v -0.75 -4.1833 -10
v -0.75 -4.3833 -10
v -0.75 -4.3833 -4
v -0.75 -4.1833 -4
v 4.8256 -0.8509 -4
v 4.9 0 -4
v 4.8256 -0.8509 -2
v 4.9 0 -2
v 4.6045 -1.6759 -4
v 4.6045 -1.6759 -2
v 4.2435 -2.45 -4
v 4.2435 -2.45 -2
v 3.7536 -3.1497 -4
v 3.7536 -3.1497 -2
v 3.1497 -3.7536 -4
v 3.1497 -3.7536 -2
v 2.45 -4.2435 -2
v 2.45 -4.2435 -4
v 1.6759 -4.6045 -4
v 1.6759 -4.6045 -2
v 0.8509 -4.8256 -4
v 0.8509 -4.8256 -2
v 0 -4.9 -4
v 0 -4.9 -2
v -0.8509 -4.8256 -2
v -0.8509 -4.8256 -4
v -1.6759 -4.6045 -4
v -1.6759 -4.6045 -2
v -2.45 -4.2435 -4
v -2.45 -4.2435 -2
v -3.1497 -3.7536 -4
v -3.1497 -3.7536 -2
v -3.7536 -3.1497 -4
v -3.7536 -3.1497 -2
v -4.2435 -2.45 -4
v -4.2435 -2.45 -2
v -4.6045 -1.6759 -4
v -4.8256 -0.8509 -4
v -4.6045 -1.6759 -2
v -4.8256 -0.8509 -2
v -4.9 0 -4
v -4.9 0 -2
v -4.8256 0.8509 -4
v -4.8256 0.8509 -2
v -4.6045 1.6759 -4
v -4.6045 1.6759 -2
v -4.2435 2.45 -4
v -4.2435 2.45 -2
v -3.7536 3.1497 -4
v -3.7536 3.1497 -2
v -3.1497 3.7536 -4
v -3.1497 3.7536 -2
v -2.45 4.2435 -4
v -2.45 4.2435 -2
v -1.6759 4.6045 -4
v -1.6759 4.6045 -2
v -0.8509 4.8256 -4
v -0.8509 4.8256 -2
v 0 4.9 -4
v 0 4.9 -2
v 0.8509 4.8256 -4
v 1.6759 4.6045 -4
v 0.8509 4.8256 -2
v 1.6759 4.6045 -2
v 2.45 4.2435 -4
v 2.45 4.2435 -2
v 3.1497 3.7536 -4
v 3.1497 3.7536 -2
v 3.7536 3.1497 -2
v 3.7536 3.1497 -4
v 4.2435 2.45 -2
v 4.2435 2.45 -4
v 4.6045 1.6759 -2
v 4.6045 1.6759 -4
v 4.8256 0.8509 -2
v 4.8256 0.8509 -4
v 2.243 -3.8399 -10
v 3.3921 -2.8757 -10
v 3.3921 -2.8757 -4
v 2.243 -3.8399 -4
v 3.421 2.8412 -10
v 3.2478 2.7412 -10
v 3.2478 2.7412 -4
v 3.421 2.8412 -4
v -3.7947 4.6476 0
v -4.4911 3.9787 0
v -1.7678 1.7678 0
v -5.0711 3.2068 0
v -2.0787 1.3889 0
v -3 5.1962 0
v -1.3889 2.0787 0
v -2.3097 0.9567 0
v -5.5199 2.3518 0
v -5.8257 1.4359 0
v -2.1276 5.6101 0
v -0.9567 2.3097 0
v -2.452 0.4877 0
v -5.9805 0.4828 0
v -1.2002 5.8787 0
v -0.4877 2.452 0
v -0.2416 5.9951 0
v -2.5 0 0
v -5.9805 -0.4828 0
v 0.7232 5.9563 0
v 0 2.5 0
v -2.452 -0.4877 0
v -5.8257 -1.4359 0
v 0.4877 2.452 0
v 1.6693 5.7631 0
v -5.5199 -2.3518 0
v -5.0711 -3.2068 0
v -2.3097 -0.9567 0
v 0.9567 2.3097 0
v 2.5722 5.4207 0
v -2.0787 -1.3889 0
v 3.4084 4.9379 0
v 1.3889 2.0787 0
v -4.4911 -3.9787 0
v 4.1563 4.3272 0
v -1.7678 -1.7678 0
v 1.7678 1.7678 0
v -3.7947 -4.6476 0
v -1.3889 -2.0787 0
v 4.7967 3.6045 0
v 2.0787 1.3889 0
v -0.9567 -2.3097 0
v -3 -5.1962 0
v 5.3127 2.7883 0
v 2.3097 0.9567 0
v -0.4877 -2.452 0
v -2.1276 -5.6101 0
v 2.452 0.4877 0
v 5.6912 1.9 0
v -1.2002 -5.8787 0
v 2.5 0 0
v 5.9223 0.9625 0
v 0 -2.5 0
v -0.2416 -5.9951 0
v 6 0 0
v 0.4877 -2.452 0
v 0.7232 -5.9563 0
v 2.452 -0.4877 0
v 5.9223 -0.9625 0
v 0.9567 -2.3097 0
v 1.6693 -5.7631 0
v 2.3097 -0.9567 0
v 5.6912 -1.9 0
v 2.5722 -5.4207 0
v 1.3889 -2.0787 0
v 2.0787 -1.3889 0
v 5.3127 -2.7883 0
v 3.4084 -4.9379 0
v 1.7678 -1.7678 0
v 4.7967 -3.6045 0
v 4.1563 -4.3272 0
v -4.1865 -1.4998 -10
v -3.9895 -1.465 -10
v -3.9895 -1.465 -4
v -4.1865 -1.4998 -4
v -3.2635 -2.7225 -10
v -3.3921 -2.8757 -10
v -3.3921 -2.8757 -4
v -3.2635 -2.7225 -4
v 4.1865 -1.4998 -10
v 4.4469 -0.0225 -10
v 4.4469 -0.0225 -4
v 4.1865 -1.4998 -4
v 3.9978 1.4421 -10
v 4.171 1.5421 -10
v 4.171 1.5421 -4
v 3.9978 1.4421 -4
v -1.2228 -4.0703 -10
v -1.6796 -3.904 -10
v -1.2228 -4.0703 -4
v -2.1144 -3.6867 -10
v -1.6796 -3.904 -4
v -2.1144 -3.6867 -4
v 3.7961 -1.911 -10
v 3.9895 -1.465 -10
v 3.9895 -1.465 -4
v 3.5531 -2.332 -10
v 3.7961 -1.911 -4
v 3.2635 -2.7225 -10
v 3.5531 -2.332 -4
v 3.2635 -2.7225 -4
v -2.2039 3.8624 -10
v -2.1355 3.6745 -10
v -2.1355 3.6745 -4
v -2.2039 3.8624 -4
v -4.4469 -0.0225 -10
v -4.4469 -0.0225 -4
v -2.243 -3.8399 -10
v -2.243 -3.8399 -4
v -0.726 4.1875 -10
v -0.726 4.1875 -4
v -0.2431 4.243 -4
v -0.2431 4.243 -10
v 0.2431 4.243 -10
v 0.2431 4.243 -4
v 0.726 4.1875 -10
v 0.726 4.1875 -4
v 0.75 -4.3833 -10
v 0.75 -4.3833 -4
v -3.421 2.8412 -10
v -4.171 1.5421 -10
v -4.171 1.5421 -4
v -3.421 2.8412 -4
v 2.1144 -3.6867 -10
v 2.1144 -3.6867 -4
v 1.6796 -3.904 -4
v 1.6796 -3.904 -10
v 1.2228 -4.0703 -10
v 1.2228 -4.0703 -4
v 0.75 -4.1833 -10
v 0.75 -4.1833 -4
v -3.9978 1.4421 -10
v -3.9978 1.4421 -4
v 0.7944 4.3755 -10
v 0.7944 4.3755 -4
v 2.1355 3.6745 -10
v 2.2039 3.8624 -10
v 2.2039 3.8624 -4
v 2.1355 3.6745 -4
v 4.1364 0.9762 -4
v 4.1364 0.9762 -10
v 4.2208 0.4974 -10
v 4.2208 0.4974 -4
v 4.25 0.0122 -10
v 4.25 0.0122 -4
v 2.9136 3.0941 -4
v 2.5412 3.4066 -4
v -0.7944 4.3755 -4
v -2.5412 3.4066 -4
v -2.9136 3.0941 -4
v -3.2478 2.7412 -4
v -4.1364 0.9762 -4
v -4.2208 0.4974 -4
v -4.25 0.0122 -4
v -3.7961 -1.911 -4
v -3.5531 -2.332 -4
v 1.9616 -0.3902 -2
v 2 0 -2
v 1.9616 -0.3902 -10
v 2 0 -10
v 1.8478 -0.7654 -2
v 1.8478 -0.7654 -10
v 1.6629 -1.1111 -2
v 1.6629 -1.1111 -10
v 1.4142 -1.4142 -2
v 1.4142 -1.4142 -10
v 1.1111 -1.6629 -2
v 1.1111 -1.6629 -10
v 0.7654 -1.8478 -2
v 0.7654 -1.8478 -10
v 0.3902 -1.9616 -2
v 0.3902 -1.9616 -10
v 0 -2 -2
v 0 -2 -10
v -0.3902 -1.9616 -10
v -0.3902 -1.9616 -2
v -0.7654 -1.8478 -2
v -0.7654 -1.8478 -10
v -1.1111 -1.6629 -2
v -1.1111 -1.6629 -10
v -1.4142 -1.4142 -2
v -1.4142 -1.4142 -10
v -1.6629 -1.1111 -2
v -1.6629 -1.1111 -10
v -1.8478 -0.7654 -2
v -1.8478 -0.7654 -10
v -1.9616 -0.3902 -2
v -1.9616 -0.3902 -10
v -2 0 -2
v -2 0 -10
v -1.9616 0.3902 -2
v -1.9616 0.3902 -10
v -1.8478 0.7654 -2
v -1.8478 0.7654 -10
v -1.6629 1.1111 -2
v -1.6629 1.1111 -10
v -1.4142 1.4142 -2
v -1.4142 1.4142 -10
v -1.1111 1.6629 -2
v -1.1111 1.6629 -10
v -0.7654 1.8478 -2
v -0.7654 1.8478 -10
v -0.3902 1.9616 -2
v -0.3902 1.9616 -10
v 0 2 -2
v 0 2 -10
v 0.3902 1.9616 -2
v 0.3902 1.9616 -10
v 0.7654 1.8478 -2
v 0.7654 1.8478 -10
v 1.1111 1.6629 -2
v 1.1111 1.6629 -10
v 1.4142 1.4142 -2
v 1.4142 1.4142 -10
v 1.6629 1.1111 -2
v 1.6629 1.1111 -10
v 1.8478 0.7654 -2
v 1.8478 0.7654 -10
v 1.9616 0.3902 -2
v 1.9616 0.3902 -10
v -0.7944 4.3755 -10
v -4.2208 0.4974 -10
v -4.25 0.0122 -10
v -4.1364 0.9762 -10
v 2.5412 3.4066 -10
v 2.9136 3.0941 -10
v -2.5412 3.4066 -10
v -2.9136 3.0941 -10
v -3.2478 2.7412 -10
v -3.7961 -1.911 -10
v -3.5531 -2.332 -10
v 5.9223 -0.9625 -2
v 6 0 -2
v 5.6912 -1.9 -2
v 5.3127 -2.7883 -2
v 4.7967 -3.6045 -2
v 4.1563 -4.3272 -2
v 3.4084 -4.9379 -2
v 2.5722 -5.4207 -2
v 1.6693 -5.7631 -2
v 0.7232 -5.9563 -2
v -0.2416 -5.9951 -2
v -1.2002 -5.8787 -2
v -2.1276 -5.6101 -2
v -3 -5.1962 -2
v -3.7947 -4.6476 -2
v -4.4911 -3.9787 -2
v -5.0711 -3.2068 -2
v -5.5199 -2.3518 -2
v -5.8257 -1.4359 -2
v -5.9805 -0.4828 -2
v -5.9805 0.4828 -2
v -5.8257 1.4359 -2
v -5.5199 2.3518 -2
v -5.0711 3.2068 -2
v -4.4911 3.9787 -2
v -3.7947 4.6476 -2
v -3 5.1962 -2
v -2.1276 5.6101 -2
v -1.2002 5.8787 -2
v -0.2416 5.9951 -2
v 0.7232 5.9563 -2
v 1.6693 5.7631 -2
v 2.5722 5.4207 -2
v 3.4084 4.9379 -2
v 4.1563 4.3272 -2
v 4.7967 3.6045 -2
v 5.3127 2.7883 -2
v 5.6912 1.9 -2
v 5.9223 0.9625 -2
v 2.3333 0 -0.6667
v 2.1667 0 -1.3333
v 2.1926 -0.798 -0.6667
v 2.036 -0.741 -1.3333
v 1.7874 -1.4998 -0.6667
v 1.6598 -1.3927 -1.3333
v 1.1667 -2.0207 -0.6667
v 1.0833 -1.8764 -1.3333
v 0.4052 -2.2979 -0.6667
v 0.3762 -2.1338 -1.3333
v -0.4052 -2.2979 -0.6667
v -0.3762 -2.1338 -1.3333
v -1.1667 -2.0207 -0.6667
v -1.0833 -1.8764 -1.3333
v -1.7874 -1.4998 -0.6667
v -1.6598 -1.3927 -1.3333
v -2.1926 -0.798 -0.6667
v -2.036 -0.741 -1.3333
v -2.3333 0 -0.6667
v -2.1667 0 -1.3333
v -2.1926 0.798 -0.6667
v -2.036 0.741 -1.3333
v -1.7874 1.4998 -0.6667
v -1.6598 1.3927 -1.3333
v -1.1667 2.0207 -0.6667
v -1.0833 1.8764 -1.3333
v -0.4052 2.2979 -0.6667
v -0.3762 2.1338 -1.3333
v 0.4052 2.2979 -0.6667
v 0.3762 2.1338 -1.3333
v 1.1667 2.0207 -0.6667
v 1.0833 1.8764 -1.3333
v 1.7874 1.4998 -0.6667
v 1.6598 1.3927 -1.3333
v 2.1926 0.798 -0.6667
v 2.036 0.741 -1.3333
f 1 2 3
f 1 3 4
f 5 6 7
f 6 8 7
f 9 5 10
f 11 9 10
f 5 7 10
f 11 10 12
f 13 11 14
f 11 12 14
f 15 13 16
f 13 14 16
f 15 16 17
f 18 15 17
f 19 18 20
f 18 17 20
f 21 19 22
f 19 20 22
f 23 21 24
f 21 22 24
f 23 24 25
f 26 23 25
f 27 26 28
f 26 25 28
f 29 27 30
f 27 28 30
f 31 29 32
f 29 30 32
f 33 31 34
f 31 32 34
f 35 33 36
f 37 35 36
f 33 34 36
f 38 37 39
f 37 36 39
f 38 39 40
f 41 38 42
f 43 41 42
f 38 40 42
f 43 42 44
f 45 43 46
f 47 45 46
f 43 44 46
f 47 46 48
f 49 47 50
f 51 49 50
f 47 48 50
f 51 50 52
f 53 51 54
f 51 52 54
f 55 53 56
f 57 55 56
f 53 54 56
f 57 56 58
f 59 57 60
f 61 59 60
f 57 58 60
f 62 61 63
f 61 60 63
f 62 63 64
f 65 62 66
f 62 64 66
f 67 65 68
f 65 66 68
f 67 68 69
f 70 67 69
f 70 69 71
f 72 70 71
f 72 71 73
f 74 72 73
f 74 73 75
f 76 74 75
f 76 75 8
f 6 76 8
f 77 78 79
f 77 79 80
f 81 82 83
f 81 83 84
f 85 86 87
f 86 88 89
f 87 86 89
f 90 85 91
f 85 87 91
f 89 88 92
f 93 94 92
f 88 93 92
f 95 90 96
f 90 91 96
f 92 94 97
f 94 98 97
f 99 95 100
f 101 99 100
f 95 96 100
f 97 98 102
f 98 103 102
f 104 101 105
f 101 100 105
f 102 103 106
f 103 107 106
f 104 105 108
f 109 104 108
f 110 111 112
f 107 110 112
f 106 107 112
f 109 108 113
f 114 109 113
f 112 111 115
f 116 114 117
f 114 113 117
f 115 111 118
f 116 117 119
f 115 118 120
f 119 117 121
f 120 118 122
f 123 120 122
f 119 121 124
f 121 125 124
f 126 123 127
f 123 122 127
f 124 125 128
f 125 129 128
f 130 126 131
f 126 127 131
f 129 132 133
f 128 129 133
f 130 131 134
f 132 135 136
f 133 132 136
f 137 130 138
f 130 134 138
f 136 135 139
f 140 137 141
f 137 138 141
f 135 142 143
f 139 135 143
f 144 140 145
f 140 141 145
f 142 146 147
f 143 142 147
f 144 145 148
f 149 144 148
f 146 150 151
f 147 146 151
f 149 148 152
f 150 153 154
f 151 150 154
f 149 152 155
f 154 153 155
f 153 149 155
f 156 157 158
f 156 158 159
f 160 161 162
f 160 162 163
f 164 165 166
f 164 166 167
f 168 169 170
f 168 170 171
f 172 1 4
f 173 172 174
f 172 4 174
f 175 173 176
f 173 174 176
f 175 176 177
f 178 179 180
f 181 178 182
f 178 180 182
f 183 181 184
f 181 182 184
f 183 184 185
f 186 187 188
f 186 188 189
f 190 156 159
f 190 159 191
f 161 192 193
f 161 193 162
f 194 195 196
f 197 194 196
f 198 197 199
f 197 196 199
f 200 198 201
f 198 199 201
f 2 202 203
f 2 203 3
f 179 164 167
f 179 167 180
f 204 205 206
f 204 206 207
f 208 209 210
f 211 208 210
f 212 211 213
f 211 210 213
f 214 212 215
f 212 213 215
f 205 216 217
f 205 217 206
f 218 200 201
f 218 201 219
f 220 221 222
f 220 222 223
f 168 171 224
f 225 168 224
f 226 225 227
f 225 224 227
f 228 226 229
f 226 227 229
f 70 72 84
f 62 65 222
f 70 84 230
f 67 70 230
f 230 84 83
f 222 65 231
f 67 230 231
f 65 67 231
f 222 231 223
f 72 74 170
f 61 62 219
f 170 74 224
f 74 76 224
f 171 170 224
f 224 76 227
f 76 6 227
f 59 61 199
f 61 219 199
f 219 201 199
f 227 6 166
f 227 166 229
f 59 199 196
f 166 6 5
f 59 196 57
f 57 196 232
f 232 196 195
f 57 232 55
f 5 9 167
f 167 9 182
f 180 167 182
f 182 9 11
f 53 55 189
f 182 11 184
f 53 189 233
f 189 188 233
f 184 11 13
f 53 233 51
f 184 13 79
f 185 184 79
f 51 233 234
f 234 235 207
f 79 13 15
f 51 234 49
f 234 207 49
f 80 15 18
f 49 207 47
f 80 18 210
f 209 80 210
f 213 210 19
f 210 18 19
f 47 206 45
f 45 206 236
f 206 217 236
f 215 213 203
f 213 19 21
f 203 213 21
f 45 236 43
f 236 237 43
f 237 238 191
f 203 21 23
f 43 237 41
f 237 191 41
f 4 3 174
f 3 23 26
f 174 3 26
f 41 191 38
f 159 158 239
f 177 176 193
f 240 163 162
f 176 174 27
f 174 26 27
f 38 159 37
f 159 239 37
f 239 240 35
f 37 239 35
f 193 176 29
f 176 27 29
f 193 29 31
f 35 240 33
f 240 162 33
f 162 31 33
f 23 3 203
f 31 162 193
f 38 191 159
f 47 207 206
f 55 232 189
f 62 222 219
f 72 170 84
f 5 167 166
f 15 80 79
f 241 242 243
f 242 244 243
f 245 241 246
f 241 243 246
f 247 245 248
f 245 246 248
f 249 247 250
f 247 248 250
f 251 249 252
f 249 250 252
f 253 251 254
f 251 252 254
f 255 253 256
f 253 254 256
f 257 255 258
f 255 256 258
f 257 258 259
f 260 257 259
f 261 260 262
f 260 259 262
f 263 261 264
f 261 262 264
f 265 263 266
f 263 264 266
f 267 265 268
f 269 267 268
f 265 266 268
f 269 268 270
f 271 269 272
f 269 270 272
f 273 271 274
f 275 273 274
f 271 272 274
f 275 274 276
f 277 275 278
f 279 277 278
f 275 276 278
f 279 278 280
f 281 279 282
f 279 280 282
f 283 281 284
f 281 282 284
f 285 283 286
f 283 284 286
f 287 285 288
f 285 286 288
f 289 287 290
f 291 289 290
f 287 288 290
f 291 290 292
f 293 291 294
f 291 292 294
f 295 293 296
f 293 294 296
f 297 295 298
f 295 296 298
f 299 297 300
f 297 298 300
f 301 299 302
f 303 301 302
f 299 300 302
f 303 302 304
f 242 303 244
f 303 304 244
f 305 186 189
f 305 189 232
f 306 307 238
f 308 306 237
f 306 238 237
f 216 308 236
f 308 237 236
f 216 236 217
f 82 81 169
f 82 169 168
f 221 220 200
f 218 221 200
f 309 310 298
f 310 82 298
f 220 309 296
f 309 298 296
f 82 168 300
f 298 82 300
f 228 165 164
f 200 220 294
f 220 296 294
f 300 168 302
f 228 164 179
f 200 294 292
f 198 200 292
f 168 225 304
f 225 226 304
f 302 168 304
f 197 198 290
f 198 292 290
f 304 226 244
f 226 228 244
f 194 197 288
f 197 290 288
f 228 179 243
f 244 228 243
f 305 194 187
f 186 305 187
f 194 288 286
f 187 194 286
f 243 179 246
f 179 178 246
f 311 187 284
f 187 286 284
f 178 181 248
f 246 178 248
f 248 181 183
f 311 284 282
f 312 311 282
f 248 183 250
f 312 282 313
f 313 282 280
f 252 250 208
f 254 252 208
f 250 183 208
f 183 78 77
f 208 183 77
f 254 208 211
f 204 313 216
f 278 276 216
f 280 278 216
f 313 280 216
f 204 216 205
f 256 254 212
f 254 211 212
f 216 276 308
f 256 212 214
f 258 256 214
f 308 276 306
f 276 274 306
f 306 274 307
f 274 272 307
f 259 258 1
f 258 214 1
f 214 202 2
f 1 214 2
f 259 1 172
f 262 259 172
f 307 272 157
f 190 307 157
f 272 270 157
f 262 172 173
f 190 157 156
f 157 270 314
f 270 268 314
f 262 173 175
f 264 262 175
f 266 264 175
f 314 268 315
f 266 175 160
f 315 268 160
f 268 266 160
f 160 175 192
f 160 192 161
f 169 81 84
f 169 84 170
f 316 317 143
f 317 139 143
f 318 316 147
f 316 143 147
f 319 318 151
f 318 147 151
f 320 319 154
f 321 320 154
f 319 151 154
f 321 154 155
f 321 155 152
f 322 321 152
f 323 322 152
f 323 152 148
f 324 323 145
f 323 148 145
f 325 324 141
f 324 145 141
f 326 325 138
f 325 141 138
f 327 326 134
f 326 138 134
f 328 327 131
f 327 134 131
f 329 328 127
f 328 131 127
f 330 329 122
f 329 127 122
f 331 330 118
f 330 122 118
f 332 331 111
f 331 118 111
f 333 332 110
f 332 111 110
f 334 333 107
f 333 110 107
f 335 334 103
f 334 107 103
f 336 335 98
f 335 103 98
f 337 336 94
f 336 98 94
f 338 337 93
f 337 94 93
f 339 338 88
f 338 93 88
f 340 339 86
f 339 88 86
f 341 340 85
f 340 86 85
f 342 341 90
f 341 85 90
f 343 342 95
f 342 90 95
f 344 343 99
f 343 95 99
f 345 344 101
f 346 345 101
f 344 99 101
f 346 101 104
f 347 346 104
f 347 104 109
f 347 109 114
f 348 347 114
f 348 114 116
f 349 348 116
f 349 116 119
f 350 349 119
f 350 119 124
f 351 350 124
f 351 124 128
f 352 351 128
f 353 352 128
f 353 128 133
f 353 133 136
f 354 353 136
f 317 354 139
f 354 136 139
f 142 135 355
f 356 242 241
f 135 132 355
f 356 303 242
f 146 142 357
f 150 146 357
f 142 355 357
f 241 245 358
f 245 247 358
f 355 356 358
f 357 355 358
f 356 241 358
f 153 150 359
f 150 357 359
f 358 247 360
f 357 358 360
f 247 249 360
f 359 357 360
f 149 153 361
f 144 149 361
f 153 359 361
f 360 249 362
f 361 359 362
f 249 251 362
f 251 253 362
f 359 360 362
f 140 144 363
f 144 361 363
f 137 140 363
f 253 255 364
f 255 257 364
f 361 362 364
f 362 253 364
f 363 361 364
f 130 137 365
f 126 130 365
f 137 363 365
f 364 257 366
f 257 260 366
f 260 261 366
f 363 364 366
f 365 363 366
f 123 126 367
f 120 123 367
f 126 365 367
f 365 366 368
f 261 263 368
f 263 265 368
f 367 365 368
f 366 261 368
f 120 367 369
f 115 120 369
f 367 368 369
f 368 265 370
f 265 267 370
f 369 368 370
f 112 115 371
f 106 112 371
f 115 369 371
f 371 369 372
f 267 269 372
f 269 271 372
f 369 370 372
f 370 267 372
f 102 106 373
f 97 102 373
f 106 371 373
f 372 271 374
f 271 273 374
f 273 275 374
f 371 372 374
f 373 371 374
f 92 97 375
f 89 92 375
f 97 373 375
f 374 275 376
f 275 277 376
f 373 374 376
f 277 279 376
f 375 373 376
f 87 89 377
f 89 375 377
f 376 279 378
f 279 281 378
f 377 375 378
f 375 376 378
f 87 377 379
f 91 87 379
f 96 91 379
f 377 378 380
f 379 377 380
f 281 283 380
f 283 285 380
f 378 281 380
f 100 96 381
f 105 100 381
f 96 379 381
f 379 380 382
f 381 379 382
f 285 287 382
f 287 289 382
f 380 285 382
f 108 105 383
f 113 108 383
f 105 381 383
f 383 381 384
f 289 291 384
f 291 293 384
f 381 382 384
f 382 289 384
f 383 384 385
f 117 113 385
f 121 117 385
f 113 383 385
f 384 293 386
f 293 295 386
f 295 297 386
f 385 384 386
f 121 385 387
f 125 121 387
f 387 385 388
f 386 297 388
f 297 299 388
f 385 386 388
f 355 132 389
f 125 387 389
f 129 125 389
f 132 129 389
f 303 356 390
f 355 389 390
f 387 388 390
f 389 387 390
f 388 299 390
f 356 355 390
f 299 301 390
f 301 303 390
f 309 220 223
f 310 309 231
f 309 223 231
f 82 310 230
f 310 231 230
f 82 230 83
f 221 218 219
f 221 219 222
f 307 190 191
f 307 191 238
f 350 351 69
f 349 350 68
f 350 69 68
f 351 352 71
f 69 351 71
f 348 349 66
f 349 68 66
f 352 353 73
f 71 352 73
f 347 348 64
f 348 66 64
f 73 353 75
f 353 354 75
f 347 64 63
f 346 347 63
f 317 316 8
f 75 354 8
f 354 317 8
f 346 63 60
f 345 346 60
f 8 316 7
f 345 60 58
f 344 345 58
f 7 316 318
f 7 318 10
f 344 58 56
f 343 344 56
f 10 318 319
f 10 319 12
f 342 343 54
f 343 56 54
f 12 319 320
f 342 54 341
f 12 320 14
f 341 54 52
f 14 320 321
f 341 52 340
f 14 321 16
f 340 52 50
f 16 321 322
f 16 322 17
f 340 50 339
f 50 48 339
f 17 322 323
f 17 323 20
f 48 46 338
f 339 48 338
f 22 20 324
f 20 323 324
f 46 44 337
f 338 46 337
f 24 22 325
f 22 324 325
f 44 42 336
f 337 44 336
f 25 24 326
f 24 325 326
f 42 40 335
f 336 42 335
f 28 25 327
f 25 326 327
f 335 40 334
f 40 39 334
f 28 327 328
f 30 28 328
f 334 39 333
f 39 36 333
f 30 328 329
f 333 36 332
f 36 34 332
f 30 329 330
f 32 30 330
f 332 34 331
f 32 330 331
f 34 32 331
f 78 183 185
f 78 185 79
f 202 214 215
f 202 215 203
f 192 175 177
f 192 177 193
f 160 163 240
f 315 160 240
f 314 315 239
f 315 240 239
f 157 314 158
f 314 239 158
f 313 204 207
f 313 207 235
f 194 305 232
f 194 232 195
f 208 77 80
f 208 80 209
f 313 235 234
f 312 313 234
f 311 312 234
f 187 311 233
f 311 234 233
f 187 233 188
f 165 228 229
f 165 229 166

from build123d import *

# Parameters (mm, degrees)
F3_DEPTH        = 6
F3_COPIES_COUNT = 9


# Not quite as in the source:
# - a pattern or mirror of a feature is missing from the dataset's text; its kind, count and spacing are read off the source's solid


with BuildPart() as f1:
    # F0 (on Front) → F1 (revolve)
    with BuildSketch(Plane.XZ):
        Polygon((6, 0), (2.5, 0), (2, -2), (2, -10), (4.25, -10), (4.25, -4), (4.9, -4), (4.9, -2), (6, -2), align=None)
    revolve(axis=Axis((0, 0, -12.1953526796), (0, 0, -1)))

    # F2 (on face) → F3 (join, through all)
    with BuildSketch(Plane(origin=(0, 0, -10), x_dir=(1, 0, 0), z_dir=(0, 0, -1))):
        with BuildLine():
            ThreePointArc((-0.75, 4.1833001327), (0, 4.25), (0.75, 4.1833001327))
            Line((0.75, 4.1833001327), (0.75, 4.3833001327))
            Line((0.75, 4.3833001327), (-0.75, 4.3833001327))
            Line((-0.75, 4.3833001327), (-0.75, 4.1833001327))
        make_face()
    f3 = extrude(amount=-F3_DEPTH)

    # F3_copies: F3 ×9 about axis
    f3_copies_axis = Axis((0, 0, 0), (0, 0, 1))
    for i in range(1, F3_COPIES_COUNT):
        add(f3.rotate(f3_copies_axis, i * 360 / F3_COPIES_COUNT))


solid = f1.part
